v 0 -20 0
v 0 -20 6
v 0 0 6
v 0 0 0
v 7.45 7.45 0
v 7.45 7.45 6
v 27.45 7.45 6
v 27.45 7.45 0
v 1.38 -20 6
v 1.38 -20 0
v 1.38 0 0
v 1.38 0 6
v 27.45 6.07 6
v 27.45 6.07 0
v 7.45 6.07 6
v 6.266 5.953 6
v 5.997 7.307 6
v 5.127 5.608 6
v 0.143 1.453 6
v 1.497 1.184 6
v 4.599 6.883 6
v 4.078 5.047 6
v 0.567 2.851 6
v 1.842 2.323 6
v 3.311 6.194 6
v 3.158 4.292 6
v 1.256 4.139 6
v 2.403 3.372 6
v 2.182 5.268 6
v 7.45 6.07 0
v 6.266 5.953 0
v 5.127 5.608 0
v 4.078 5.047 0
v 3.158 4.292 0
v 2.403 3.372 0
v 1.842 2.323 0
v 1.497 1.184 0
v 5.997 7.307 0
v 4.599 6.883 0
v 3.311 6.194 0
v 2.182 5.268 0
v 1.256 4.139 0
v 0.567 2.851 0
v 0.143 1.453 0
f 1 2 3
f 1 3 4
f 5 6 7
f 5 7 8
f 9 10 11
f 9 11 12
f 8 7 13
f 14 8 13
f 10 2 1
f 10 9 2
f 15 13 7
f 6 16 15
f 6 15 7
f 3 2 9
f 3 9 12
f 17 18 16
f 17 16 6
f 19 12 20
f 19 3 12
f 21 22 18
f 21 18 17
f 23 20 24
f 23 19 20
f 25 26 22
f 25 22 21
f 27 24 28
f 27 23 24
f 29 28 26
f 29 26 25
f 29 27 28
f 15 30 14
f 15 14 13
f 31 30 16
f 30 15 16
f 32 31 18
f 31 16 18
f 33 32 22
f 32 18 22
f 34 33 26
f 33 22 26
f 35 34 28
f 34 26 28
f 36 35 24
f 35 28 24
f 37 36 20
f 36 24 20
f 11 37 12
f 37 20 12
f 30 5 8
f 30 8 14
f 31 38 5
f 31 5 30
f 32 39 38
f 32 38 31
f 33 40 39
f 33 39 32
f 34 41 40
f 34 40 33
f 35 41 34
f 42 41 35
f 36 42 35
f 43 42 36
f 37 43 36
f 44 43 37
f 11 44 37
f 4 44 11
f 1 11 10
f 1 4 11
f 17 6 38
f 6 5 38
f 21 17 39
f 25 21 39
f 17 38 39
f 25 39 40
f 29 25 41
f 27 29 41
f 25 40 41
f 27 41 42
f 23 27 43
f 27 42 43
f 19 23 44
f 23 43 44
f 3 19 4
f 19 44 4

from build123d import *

# Parameters (mm, degrees)
SKETCH001_W = 1.38
SKETCH001_H = 6


with BuildPart() as part:
    # AdditivePipe: sweep along a path in Sketch002
    with BuildLine(Plane.XY) as additivepipe_path:
        Line((27.45, 6.07), (7.45, 6.07))
        ThreePointArc((7.45, 6.07), (3.157862, 4.292138), (1.38, 0))
        Line((1.38, 0), (1.38, -20))
    # Sketch001 → AdditivePipe (sweep)
    with BuildSketch(Plane.XZ):
        with Locations((0.69, 3)):
            Rectangle(SKETCH001_W, SKETCH001_H)
    sweep(path=additivepipe_path.line)


solid = part.part
